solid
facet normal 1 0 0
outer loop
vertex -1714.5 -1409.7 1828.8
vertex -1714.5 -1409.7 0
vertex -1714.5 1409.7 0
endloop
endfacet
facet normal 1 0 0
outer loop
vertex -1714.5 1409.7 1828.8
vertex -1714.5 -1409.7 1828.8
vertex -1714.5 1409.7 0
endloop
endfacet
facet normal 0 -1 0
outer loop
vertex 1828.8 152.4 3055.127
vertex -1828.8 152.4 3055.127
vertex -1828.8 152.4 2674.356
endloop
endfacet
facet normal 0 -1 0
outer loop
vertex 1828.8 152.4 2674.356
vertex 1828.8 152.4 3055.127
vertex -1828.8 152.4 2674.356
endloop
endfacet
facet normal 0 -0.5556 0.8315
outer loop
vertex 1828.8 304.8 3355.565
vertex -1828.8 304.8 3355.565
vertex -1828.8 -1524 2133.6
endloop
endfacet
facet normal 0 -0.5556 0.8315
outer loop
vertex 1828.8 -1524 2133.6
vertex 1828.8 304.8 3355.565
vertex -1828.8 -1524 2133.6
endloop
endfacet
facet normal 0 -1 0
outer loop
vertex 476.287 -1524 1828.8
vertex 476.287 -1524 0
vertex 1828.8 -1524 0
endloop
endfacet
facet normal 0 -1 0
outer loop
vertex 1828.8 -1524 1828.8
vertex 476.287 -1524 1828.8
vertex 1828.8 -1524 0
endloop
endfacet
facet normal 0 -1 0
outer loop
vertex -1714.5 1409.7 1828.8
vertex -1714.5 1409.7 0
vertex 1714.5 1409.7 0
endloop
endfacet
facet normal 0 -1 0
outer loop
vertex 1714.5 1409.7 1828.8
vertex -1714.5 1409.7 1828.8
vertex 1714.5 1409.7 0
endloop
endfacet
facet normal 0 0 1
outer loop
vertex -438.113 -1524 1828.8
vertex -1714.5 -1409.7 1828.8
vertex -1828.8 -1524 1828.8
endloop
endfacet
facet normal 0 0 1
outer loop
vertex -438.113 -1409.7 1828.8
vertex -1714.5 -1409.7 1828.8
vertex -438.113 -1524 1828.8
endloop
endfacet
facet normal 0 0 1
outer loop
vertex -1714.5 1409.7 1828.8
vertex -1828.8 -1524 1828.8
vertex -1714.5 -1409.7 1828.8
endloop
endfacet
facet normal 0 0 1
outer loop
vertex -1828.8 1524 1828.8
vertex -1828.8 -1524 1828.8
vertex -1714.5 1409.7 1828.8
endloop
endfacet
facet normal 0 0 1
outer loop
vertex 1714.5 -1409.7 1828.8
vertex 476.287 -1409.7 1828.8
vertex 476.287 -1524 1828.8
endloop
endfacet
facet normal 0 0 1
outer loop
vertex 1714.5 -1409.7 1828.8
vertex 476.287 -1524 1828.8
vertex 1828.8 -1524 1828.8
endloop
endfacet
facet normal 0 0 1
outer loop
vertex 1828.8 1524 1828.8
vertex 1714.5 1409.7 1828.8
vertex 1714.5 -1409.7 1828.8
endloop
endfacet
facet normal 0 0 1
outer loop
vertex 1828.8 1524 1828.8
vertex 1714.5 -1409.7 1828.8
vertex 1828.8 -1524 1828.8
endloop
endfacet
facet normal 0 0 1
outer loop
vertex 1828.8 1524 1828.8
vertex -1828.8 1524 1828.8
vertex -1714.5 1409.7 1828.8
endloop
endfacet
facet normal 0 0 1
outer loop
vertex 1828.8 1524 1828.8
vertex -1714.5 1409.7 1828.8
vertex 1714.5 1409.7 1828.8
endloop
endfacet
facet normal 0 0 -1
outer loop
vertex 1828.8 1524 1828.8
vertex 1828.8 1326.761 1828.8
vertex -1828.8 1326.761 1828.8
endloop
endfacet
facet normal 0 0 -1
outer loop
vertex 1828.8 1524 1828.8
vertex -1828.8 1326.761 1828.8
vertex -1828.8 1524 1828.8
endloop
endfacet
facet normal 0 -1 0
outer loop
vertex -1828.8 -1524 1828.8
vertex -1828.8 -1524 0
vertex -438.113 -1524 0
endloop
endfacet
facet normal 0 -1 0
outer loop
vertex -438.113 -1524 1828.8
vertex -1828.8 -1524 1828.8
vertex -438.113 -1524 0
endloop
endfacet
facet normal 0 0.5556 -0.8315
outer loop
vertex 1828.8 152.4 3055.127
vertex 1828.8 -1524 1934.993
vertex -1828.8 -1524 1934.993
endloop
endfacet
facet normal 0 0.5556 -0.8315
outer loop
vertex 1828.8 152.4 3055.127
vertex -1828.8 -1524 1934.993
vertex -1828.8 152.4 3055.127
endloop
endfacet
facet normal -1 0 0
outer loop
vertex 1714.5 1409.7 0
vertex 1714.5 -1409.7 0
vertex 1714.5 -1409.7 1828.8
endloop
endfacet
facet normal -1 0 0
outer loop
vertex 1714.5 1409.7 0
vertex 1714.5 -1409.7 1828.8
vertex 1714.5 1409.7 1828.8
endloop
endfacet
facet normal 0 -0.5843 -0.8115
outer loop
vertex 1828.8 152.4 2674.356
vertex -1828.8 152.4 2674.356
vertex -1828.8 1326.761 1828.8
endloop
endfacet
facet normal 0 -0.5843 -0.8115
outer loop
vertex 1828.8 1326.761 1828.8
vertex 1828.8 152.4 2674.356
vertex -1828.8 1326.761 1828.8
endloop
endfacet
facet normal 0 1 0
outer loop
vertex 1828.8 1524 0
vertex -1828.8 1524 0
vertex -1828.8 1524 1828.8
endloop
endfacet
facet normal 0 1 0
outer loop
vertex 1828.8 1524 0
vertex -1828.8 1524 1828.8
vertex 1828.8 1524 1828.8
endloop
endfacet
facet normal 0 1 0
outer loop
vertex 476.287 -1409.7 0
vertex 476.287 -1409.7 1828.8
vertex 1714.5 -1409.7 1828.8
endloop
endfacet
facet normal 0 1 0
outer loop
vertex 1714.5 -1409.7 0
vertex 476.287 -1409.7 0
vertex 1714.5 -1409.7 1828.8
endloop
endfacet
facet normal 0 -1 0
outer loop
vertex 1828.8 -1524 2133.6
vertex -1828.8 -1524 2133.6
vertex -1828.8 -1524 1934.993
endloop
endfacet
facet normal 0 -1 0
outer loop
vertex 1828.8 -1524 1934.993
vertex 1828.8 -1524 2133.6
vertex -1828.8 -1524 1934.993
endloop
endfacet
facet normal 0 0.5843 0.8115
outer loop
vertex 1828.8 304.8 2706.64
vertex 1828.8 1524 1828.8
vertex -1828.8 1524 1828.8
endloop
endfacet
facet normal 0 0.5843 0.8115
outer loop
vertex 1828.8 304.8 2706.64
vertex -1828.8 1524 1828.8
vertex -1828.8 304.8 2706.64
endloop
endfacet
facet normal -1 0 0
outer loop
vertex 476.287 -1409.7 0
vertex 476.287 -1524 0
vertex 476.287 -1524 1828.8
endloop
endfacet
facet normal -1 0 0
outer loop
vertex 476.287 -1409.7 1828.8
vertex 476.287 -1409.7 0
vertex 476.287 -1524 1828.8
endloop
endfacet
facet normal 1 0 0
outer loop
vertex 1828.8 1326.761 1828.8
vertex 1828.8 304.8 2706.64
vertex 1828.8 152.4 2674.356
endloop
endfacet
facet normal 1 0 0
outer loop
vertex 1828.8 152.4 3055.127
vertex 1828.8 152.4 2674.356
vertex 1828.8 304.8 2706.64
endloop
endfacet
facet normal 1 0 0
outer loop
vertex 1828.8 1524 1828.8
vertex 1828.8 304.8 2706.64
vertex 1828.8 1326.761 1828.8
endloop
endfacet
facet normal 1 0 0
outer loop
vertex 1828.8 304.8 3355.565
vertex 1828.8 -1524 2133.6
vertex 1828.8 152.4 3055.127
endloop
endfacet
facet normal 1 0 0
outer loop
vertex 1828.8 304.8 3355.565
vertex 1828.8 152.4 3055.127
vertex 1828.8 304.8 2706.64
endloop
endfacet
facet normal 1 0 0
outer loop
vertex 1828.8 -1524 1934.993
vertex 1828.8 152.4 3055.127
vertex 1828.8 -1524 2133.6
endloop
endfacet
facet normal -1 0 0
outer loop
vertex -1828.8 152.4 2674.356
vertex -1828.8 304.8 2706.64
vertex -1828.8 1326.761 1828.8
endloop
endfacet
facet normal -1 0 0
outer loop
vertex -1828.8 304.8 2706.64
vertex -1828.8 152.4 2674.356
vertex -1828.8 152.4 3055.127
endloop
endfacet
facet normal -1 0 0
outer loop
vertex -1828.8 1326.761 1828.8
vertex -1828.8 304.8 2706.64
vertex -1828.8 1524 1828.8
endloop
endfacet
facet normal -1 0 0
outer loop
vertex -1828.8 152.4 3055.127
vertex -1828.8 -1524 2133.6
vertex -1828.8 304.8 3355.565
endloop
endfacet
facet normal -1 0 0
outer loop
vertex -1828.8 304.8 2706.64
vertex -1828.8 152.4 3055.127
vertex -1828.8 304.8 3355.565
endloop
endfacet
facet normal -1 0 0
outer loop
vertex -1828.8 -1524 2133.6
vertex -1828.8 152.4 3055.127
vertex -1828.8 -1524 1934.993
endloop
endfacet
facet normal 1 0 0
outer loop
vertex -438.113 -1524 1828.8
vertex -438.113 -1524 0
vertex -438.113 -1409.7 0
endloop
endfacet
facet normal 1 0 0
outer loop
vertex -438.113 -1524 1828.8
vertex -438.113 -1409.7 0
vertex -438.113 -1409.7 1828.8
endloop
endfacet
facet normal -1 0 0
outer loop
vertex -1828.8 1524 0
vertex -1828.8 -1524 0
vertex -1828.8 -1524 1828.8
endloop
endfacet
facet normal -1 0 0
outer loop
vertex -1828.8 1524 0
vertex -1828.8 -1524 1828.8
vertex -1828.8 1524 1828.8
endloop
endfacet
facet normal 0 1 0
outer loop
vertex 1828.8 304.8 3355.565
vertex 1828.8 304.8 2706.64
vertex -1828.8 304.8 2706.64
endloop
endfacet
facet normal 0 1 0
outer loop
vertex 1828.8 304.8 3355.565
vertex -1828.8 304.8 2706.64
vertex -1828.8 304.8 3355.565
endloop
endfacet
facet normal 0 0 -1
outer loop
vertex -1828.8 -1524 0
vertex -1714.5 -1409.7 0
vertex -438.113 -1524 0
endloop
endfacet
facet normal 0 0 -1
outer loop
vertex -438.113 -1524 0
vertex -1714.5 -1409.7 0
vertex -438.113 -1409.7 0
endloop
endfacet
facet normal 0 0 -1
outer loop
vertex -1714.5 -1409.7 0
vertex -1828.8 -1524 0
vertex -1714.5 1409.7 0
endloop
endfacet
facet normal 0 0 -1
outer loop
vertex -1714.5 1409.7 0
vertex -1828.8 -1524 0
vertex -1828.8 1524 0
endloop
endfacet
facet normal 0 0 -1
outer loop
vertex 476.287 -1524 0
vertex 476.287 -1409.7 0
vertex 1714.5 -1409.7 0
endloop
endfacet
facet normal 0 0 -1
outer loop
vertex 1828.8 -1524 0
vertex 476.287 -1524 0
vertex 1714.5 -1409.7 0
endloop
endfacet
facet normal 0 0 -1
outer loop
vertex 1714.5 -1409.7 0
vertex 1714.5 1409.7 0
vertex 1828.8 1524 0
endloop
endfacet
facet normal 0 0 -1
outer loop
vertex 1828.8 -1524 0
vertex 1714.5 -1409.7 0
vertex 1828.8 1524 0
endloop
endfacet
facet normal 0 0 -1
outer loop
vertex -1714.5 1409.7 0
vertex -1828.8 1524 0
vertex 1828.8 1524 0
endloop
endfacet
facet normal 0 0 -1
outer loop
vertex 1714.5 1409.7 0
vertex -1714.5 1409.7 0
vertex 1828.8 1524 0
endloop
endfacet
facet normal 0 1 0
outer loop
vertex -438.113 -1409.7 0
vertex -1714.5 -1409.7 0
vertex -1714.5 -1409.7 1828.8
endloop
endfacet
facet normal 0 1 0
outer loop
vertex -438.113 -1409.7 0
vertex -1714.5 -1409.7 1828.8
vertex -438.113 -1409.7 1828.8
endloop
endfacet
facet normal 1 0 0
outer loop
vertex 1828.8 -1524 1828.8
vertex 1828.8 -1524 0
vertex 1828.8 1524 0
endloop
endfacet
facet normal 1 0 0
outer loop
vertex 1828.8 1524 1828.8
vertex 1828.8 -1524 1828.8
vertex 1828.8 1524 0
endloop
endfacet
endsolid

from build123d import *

# Parameters (mm, degrees)
F0_W     = 3657.6
F0_H     = 3048
F0_W_2   = 3429
F0_H_2   = 2819.4
F1_DEPTH = 1828.8
F3_DEPTH = 3657.6
F4_W     = 914.4
F4_H     = 1828.8
F5_DEPTH = 114.3


with BuildPart() as f1:
    # F0 (on Top) → F1 (new body)
    with BuildSketch(Plane.XY):
        Rectangle(F0_W, F0_H)
        Rectangle(F0_W_2, F0_H_2, mode=Mode.SUBTRACT)
    extrude(amount=F1_DEPTH)

    # F4 (on face) → F5 (cut, through all)
    with BuildSketch(Plane.XZ.offset(1524)):
        with Locations((19.087383, 914.4)):
            Rectangle(F4_W, F4_H)
    extrude(amount=-F5_DEPTH, mode=Mode.SUBTRACT)


with BuildPart() as f3:
    # F2 (on face) → F3 (new body)
    with BuildSketch(Plane.YZ.offset(1828.8)):
        Polygon((1524, 1828.8), (304.8, 2706.639945), (304.8, 3355.565093), (-1524, 2133.6), (-1524, 1934.992569), (152.4, 3055.127237), (152.4, 2674.355627), (1326.761485, 1828.8), align=None)
    extrude(amount=-F3_DEPTH)


solid = Compound([f1.part, f3.part])
